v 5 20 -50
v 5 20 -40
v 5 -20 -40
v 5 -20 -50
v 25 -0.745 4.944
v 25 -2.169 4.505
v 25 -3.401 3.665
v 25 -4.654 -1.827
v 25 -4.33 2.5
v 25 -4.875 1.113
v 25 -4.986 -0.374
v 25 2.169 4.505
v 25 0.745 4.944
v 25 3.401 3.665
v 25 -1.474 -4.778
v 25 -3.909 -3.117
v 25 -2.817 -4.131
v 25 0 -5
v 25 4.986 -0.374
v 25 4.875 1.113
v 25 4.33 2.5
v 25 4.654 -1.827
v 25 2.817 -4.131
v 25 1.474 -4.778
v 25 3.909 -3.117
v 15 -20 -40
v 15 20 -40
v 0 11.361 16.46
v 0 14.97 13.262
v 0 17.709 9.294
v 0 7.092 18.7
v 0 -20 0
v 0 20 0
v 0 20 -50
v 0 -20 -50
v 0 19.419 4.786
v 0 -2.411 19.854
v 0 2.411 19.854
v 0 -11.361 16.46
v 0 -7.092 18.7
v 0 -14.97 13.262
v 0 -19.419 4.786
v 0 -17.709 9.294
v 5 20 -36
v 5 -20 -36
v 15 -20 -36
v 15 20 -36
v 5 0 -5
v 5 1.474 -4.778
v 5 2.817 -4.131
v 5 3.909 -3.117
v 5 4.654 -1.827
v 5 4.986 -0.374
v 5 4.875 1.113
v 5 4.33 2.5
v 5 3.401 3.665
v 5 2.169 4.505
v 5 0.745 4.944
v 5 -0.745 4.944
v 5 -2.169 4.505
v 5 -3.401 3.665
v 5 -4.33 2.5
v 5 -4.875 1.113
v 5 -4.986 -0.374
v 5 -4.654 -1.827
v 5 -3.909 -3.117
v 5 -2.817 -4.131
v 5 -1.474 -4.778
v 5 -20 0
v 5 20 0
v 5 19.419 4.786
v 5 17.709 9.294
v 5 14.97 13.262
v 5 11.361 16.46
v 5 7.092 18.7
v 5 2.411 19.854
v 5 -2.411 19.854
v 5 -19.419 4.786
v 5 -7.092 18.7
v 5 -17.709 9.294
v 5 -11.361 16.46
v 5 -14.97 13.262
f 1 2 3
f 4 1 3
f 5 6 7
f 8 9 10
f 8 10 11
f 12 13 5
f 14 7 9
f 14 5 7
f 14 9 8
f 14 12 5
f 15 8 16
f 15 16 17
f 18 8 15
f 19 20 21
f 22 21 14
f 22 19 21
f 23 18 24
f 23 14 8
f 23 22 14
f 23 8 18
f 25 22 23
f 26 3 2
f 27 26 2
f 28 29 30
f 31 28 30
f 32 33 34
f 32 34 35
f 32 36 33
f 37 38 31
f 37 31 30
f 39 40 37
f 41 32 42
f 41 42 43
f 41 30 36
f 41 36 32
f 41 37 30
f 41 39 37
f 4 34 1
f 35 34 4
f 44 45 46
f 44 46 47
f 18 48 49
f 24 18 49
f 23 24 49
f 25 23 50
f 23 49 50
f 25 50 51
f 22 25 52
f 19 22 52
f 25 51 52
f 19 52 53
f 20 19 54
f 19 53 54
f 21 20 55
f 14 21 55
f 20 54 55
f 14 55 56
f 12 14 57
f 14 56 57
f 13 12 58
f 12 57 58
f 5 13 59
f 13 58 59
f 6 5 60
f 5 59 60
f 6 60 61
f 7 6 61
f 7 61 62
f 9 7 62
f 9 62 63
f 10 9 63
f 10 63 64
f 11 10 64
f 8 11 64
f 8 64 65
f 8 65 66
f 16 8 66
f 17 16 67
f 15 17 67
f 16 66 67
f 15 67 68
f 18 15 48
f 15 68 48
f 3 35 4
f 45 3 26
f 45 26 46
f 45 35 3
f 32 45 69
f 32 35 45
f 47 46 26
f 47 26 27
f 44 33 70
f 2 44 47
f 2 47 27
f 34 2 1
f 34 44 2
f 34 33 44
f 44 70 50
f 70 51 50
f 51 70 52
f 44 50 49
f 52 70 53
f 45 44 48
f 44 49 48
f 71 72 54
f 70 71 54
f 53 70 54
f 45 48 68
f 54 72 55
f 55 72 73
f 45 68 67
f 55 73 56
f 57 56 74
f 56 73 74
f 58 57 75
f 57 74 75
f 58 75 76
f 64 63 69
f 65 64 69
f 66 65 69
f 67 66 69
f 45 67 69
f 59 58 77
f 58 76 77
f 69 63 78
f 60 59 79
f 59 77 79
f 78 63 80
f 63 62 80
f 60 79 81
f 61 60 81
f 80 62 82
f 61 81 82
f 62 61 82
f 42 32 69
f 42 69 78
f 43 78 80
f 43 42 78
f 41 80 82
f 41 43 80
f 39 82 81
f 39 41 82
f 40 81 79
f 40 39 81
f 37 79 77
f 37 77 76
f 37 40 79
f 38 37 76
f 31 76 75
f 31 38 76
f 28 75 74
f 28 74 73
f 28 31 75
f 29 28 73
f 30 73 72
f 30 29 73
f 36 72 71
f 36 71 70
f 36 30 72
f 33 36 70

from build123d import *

# Parameters (mm, degrees)
BOSS_EXTRUDE1_DEPTH = 5
SKETCH2_W           = 40
SKETCH2_H           = 4
BOSS_EXTRUDE2_DEPTH = 10
SKETCH3_R           = 5
BOSS_EXTRUDE3_DEPTH = 20


with BuildPart() as part:
    # Sketch1 → Boss-Extrude1 (new body)
    with BuildSketch(Plane.YZ):
        with BuildLine():
            Line((20, 0), (20, -50))
            Line((20, -50), (-20, -50))
            Line((-20, -50), (-20, 0))
            ThreePointArc((-20, 0), (0, 20), (20, 0))
        make_face()
    extrude(amount=BOSS_EXTRUDE1_DEPTH)

    # Sketch2 → Boss-Extrude2 (add)
    with BuildSketch(Plane.YZ.offset(5)):
        with Locations((0, -38)):
            Rectangle(SKETCH2_W, SKETCH2_H)
    extrude(amount=BOSS_EXTRUDE2_DEPTH)

    # Sketch3 → Boss-Extrude3 (add)
    with BuildSketch(Plane.YZ.offset(5)):
        with Locations(Location((0, 0, 0), (0, 0, 270))):
            Circle(SKETCH3_R)
    extrude(amount=BOSS_EXTRUDE3_DEPTH)


solid = part.part
